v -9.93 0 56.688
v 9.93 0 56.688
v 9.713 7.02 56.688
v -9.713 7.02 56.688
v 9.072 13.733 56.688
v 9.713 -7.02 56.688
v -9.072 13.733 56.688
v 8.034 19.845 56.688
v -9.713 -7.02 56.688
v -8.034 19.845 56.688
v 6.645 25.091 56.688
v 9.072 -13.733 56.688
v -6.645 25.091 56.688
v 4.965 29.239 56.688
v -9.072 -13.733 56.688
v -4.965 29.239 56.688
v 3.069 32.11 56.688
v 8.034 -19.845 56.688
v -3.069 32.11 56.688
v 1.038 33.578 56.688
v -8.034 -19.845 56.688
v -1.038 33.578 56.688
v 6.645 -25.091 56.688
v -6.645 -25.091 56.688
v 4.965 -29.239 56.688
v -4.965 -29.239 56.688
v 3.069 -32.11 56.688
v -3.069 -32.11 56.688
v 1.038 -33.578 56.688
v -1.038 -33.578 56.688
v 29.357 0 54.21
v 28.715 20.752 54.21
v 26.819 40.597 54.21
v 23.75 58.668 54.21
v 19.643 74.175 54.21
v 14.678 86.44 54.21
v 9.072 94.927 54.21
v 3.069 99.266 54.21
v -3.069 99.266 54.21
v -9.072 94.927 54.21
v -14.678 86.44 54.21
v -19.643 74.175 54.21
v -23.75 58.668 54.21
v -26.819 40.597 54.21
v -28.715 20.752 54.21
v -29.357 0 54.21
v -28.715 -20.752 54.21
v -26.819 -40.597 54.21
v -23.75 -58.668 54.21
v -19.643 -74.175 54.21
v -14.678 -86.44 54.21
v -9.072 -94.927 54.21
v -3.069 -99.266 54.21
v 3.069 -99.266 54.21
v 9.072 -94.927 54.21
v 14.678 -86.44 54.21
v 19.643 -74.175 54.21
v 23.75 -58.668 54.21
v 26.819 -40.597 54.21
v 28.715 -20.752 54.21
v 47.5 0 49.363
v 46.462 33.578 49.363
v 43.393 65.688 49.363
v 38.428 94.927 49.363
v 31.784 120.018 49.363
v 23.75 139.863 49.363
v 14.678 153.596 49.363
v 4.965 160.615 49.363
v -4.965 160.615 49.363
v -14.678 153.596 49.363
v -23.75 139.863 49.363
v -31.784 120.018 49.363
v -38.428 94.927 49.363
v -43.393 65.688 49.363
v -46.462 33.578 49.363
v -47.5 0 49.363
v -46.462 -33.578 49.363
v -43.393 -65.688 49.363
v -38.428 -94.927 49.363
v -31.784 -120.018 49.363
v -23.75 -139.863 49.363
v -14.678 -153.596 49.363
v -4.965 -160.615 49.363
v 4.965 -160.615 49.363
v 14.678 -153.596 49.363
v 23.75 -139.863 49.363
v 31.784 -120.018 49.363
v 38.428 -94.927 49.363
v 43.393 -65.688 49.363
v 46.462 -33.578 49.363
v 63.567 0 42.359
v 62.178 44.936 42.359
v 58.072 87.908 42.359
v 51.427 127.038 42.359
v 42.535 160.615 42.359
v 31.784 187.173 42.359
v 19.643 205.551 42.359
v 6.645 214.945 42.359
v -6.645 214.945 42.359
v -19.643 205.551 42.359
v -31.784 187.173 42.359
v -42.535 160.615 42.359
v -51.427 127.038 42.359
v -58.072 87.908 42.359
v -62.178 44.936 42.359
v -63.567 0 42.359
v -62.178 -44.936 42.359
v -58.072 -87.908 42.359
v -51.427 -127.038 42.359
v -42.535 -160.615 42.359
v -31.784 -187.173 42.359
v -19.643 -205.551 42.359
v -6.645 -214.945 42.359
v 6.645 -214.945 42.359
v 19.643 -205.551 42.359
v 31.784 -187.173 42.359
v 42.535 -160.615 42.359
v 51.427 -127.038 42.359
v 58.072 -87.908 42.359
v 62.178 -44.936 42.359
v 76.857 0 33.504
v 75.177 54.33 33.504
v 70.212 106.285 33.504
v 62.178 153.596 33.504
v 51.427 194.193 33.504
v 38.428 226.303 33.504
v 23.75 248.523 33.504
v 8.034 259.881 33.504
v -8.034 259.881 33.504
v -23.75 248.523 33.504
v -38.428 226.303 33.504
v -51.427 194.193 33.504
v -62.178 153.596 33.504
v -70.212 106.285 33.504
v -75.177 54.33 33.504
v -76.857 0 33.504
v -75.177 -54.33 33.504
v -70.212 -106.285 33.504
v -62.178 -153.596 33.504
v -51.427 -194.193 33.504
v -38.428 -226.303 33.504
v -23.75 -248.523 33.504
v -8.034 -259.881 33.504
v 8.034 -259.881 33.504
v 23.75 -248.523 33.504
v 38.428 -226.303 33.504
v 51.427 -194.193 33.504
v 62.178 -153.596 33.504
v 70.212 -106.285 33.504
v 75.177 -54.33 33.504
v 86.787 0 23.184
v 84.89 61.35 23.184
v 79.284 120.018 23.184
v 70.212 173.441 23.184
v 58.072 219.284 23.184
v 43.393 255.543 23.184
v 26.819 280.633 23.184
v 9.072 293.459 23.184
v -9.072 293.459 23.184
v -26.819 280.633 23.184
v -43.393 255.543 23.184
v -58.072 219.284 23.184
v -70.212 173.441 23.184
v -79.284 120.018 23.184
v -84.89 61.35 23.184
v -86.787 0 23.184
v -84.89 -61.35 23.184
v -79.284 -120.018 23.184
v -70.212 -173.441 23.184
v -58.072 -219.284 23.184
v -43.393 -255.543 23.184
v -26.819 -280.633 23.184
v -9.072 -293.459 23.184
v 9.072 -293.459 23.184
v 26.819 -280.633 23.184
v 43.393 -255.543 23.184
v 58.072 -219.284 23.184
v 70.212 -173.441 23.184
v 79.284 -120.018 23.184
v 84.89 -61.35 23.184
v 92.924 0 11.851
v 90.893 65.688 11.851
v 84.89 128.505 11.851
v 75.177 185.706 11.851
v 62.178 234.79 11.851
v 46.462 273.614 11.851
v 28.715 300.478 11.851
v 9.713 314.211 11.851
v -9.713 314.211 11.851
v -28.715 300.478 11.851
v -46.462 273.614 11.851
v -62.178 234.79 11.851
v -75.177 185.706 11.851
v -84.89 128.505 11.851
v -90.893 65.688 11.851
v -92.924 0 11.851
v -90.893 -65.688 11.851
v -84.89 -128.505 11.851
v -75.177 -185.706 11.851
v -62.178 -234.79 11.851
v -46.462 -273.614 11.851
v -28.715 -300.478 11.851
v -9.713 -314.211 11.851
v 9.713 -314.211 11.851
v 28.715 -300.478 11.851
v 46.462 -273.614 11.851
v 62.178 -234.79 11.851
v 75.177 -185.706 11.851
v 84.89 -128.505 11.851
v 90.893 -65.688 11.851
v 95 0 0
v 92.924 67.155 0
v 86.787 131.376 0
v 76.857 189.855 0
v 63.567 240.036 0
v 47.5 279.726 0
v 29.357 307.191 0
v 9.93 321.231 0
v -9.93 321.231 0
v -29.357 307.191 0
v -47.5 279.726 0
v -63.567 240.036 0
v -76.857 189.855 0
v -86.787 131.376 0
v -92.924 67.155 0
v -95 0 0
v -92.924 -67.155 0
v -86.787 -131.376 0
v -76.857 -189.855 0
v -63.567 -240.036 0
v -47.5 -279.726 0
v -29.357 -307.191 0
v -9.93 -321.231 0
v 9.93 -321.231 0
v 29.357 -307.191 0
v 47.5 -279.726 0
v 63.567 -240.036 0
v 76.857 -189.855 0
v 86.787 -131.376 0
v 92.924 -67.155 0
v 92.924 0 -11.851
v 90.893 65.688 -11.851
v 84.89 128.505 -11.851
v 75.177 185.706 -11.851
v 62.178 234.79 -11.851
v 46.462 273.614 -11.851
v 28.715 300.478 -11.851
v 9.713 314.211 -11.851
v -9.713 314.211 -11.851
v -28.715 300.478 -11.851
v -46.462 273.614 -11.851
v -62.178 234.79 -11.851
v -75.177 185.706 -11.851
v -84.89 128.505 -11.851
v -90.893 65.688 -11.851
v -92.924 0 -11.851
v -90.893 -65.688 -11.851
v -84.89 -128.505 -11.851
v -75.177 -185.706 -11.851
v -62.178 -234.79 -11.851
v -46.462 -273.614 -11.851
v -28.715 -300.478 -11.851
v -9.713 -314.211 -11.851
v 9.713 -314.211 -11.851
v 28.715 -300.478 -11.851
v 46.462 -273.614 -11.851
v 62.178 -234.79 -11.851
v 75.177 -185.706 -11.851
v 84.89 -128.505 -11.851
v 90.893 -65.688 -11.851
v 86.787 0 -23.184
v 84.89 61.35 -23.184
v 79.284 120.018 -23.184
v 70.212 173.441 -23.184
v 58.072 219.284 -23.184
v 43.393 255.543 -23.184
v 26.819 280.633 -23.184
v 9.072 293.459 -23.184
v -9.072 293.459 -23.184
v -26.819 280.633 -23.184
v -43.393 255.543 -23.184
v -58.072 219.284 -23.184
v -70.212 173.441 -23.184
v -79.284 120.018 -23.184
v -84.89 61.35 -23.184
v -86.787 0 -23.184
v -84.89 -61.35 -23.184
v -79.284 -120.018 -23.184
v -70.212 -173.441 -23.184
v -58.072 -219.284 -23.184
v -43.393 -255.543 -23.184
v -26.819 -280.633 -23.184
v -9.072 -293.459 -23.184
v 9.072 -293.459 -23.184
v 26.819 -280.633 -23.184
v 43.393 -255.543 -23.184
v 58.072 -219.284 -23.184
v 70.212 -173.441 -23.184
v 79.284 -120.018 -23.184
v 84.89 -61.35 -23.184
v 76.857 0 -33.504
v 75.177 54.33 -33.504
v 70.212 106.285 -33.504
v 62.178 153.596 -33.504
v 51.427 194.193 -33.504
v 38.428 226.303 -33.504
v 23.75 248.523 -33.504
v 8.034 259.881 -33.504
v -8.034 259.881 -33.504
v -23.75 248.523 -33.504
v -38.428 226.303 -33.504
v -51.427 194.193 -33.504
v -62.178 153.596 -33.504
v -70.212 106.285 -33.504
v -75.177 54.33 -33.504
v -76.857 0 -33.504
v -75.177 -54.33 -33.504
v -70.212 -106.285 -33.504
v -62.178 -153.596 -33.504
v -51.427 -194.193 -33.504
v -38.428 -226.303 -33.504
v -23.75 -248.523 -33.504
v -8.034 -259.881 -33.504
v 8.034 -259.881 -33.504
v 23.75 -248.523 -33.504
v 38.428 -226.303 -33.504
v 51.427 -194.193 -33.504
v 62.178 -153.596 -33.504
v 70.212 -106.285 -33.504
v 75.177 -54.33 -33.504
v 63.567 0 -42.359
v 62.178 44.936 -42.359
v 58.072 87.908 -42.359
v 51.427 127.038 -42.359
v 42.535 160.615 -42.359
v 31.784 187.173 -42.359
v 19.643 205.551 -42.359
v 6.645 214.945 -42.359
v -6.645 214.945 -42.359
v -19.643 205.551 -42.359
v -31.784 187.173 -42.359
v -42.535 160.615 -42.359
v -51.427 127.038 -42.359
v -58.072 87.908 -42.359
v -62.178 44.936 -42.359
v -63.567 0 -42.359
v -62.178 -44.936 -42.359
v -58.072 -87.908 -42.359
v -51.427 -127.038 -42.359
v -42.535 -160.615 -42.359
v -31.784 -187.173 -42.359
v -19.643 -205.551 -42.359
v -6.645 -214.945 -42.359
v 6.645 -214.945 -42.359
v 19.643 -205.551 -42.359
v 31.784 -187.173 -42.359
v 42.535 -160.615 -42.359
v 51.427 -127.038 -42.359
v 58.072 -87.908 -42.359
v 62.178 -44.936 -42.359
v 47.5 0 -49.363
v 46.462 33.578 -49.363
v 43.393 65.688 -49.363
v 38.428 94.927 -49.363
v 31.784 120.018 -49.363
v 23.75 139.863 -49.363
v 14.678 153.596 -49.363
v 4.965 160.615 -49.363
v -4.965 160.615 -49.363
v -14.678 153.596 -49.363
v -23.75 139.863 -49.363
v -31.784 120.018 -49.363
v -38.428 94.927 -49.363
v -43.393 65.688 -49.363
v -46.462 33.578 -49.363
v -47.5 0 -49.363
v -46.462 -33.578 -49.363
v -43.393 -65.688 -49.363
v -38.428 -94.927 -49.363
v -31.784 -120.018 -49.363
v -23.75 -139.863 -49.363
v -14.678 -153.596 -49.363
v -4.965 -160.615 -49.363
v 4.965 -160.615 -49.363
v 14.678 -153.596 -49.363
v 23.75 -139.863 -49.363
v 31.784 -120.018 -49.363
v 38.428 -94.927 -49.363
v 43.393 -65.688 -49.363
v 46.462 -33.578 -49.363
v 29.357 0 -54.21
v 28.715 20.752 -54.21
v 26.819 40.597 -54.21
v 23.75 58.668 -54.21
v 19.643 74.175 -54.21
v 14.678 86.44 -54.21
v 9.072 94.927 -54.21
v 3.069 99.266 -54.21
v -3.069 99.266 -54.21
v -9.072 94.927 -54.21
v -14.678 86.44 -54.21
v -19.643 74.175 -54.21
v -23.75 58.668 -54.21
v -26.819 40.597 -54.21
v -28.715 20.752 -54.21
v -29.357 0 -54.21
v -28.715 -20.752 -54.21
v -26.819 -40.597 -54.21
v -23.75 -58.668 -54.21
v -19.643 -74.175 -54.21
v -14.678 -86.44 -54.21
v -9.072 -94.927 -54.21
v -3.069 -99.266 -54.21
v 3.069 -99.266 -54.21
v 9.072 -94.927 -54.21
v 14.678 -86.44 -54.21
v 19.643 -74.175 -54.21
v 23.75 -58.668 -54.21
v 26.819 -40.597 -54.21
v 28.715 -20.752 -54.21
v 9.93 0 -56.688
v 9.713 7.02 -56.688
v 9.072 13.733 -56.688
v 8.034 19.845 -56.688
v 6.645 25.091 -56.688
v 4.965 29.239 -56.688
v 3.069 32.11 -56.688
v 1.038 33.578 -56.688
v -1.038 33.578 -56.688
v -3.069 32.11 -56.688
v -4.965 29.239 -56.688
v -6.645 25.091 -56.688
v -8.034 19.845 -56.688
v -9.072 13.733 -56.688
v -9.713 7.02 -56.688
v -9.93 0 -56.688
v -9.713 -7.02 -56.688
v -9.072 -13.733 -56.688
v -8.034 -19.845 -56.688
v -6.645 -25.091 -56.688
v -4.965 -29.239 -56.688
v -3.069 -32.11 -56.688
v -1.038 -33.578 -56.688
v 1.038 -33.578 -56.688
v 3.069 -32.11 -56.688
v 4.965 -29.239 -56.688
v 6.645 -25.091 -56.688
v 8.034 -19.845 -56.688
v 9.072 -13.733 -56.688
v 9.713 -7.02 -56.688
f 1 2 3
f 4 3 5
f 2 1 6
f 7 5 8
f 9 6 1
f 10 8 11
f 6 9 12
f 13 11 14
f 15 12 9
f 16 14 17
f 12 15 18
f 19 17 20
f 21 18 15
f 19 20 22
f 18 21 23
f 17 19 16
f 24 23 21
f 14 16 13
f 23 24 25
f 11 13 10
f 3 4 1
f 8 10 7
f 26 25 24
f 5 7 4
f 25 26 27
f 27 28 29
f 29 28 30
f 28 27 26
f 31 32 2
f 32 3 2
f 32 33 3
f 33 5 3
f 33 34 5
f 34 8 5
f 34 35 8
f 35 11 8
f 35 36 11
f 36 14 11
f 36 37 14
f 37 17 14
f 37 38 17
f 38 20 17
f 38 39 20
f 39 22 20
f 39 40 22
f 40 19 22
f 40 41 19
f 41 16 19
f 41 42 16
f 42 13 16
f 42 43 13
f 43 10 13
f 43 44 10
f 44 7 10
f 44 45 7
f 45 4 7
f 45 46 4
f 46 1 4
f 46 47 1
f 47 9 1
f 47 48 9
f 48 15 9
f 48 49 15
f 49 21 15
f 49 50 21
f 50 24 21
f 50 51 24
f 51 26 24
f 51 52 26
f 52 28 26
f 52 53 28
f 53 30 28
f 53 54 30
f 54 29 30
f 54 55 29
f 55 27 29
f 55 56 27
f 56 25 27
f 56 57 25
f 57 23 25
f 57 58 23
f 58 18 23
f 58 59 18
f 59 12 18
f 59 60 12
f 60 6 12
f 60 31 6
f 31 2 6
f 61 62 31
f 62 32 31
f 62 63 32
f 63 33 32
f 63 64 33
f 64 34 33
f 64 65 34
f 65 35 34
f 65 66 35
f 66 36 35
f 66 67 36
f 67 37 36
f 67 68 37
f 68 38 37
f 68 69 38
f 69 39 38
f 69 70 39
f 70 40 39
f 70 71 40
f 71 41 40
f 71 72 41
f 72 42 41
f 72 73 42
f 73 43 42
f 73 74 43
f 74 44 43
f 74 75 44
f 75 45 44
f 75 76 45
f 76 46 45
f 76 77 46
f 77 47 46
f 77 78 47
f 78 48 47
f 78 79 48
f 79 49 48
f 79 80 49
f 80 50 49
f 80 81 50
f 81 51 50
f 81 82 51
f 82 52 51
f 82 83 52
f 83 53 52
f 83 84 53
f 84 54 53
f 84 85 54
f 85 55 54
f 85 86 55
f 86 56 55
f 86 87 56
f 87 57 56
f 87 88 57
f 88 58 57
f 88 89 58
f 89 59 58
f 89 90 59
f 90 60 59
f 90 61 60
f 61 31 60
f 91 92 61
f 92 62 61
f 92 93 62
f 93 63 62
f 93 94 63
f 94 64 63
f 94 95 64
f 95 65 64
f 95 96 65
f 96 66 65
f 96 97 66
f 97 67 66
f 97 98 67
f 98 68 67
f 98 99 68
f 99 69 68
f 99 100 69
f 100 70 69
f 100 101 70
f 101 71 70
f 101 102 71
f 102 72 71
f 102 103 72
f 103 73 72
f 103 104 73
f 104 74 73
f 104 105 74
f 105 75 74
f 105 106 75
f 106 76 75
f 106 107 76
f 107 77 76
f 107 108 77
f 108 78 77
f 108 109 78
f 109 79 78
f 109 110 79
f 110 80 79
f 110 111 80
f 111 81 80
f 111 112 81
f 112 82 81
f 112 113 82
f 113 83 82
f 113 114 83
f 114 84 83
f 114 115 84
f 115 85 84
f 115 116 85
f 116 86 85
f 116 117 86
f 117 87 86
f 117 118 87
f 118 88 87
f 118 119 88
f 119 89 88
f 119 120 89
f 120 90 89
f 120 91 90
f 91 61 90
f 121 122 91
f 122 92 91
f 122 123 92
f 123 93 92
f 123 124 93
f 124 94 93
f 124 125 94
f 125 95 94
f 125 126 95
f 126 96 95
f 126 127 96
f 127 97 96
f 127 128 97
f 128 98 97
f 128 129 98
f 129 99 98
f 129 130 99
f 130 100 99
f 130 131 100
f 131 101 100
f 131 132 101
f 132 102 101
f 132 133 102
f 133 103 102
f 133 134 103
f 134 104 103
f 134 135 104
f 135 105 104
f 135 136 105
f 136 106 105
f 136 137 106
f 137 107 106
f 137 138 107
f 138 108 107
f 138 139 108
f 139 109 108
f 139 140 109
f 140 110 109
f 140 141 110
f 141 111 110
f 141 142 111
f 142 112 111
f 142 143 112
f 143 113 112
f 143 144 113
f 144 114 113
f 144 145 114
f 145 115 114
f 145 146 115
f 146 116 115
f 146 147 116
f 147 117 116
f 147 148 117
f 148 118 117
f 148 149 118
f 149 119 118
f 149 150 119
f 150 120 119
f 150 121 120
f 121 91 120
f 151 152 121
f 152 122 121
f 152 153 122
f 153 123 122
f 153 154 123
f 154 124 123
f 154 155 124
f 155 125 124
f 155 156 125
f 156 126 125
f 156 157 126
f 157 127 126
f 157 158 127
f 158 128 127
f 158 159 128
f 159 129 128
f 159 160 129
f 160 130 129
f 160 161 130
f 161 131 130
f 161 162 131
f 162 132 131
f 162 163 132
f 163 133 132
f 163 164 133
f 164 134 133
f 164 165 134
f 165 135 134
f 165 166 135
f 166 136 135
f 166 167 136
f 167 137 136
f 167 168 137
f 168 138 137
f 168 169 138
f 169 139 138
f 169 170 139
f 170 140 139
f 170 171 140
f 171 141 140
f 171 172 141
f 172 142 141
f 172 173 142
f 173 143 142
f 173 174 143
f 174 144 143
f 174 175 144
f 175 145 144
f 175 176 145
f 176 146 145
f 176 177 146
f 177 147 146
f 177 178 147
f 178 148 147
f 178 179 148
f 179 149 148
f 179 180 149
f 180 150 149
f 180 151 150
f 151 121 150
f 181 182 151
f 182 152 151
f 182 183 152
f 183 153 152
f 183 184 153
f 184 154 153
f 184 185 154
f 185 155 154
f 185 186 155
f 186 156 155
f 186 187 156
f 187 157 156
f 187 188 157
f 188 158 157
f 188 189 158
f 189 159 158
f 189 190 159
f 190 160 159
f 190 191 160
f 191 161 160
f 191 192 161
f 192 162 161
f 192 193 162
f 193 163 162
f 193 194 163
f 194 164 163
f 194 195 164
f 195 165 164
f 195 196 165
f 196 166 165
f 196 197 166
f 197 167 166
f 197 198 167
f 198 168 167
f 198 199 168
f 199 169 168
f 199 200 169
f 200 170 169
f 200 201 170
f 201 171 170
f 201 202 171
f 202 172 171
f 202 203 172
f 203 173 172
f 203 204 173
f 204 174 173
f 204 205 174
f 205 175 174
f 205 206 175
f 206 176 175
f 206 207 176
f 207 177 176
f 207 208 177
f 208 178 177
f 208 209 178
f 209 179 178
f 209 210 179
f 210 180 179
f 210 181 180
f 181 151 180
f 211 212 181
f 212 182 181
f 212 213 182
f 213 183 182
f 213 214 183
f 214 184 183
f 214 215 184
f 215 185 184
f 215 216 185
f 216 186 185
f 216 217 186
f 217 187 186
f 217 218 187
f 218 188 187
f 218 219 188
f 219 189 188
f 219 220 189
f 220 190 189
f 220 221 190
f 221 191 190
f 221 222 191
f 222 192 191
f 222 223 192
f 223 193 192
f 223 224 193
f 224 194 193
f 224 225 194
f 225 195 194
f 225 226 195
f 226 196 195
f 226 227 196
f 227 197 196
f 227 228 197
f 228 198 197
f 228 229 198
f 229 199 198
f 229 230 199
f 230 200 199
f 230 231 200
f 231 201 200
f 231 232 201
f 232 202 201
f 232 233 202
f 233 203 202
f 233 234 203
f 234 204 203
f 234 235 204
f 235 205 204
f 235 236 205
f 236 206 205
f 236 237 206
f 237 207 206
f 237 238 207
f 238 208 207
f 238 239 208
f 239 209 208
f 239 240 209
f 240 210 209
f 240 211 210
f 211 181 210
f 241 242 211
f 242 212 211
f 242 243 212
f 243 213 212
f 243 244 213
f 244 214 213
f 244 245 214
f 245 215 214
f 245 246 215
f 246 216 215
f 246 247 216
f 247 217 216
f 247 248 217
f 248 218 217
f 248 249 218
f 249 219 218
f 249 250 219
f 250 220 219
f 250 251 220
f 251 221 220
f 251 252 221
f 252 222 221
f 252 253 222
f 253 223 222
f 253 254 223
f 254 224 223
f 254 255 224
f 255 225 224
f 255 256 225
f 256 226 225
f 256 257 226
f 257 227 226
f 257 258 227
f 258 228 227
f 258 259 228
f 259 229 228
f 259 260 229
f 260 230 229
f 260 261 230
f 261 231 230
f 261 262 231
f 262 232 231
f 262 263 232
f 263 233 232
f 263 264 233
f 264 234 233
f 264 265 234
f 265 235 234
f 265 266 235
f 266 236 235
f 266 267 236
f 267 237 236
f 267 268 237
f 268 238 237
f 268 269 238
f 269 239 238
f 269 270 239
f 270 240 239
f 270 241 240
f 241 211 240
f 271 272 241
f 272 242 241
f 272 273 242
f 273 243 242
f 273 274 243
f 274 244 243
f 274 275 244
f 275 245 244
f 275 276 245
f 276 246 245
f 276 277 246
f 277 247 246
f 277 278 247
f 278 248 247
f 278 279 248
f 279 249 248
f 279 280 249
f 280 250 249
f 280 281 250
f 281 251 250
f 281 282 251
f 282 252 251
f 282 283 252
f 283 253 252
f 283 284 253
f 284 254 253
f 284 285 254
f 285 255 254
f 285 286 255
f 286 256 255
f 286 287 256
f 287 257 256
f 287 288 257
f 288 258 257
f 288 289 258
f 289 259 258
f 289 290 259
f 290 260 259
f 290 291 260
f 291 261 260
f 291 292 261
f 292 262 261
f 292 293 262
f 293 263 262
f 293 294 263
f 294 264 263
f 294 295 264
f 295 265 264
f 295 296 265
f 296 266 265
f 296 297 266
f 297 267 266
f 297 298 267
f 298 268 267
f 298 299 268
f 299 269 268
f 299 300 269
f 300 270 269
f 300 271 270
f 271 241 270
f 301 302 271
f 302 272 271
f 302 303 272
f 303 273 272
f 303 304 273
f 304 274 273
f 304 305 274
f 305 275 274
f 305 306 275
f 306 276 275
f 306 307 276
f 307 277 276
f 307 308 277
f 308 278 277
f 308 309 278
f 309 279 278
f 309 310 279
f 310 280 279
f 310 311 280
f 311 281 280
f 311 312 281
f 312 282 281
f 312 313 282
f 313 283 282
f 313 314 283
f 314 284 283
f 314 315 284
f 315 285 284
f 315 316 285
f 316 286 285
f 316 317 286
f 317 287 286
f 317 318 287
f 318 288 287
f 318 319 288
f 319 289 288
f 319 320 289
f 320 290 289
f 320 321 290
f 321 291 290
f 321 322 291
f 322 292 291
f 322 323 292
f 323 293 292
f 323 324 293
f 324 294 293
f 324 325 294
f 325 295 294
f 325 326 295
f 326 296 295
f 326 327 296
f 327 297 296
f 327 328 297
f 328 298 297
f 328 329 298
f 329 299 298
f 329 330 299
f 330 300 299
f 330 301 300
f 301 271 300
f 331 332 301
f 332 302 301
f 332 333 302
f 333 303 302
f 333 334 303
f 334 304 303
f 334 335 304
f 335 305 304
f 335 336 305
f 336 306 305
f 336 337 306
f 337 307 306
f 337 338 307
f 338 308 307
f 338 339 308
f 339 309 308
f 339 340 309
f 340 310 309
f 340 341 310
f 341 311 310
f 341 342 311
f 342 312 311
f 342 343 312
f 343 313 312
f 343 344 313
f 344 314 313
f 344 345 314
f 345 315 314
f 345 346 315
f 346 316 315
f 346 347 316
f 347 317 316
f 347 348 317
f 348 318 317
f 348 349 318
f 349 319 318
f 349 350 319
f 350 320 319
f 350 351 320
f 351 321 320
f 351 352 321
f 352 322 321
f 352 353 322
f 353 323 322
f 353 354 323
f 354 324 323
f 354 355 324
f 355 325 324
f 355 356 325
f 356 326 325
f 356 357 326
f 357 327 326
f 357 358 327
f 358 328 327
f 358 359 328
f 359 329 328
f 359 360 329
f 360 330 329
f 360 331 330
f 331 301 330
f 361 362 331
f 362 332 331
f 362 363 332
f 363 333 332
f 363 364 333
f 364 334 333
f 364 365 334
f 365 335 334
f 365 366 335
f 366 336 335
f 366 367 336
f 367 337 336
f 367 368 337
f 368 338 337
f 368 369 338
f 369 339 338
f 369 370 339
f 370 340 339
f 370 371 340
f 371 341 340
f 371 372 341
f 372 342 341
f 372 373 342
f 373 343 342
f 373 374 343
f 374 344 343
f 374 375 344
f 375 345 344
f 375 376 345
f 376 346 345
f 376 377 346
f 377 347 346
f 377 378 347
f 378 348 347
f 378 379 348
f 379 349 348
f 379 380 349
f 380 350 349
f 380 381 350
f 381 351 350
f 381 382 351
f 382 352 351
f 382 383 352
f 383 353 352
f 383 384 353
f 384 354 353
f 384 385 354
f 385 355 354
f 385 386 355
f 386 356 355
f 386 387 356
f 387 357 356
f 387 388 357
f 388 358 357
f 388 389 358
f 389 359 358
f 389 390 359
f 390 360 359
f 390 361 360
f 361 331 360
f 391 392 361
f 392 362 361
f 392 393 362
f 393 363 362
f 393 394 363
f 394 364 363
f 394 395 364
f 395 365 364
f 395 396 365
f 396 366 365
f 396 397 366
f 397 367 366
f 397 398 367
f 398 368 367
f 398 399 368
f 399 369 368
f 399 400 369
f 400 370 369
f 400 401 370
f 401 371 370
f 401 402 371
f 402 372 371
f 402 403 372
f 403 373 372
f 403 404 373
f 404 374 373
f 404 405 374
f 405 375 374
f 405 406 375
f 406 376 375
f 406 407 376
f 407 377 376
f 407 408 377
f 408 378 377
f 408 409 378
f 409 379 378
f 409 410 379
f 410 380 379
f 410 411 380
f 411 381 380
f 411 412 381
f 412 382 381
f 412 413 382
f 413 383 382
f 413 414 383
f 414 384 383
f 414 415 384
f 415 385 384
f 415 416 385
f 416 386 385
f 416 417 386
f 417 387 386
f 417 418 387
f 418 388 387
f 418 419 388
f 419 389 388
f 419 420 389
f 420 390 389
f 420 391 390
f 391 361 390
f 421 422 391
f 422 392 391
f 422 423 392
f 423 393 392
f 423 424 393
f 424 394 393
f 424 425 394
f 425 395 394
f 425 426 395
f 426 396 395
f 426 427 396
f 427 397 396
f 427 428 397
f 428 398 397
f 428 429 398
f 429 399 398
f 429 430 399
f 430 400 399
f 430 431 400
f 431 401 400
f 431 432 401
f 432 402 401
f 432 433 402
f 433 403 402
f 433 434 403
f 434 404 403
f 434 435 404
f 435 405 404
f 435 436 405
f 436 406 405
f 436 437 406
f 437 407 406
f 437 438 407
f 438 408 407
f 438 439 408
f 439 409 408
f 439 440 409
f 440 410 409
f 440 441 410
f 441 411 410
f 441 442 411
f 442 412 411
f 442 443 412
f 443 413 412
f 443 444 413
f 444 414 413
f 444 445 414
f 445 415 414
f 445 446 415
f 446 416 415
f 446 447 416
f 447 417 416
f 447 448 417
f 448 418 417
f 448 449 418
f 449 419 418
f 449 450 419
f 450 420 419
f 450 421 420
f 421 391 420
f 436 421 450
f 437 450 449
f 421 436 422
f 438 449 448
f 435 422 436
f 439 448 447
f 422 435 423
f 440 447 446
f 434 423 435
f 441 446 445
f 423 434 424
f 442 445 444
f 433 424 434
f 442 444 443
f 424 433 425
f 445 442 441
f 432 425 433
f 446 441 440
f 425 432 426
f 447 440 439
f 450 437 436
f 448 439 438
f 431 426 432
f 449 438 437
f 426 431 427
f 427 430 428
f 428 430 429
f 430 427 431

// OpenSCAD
// Generated by SolidPython 1.0.1 on 2020-07-29 00:46:46


scale(v = [5, 17, 3]) {
	sphere(r = 19);
}
/***********************************************
*********      SolidPython code:      **********
************************************************
 
# import packages: SolidPython
from solid import *
from solid.utils import *
from itertools import chain, combinations, permutations


class Resize:

    def __init__(self, scad_file):
        self.scad_file = scad_file
        #self.scad_file = import_scad(scad_file)
        # cone/cylinder param:
        self.r1 = 0
        self.r2 = 0
        self.h = 0
        # rectangular prism param:
        self.w = 0
        self.l = 0
        # ellipse param:
        self.r = 0

    # import OpenScad code (file name corresponds to shape)


    # classify shape + parameters
    def assign(self, param1, param2, param3):
        if self.scad_file == 'cone.scad':
            self.r1 = param1
            self.r2 = param2
            self.h = param3
        elif self.scad_file == 'cylinder.scad':
            self.r1 = param1
            self.r2 = param2
            self.h = param3
        elif self.scad_file == 'rectangularPrism.scad':
            self.h = param1
            self.l = param2
            self.w = param3
        else:
            self.r = param1
            self.h = param2

    # resize parameters
    def iterate(self):
        x = range(3, 20, 2)
        i = 1
        if self.scad_file == 'cone.scad':
            tempList = list(permutations(x, 2))
            for temp in tempList:
                param1 = temp[0]
                param2 = temp[1]
                filepath = 'produced_scad_files/' + 'cone' + str(param1) + '_' + str(param2) + '_' + '.scad'
                scad_render_to_file(cylinder(h=param1, r1=param2, r2=0), filepath)

        elif self.scad_file == 'cylinder.scad':
            tempList = list(permutations(x, 3))
            for temp in tempList:
                param1 = temp[0]
                param2 = temp[1]
                filepath = 'produced_scad_files/' + 'cylinder' + str(param1) + '_' + str(param2) + '_' + '.scad'
                scad_render_to_file(cylinder(h=param1, r1=param2, r2=param2), filepath)

        elif self.scad_file == 'rectangularPrism.scad':
            tempList = list(permutations(x, 3))
            for temp in tempList:
                param1 = temp[0]
                param2 = temp[1]
                param3 = temp[2]
                filepath = 'produced_scad_files/' + 'rectangularPrism' + str(param1) + '_' + str(param2) + '_' + str(
                    param3) + '.scad'
                scad_render_to_file(cube(size=(param1, param2, param3)), filepath)

        elif self.scad_file == 'ellipse.scad':
            tempList = list(permutations(x, 4))
            for temp in tempList:
                param1 = temp[0]
                param2 = temp[1]
                param3 = temp[2]
                param4 = temp[3]
                filepath = 'produced_scad_files/' + 'ellipse' + str(param1) + '_' + str(param2) + '_' + str(param3) + '_' + str(param4) + '.scad'
                scad_render_to_file(scale([param1, param2, param3])(sphere(r=param4)), filepath)

    def render_to_scadfile(self):
        scad_render_to_file(scad, 'example.scad') 
 
************************************************/
